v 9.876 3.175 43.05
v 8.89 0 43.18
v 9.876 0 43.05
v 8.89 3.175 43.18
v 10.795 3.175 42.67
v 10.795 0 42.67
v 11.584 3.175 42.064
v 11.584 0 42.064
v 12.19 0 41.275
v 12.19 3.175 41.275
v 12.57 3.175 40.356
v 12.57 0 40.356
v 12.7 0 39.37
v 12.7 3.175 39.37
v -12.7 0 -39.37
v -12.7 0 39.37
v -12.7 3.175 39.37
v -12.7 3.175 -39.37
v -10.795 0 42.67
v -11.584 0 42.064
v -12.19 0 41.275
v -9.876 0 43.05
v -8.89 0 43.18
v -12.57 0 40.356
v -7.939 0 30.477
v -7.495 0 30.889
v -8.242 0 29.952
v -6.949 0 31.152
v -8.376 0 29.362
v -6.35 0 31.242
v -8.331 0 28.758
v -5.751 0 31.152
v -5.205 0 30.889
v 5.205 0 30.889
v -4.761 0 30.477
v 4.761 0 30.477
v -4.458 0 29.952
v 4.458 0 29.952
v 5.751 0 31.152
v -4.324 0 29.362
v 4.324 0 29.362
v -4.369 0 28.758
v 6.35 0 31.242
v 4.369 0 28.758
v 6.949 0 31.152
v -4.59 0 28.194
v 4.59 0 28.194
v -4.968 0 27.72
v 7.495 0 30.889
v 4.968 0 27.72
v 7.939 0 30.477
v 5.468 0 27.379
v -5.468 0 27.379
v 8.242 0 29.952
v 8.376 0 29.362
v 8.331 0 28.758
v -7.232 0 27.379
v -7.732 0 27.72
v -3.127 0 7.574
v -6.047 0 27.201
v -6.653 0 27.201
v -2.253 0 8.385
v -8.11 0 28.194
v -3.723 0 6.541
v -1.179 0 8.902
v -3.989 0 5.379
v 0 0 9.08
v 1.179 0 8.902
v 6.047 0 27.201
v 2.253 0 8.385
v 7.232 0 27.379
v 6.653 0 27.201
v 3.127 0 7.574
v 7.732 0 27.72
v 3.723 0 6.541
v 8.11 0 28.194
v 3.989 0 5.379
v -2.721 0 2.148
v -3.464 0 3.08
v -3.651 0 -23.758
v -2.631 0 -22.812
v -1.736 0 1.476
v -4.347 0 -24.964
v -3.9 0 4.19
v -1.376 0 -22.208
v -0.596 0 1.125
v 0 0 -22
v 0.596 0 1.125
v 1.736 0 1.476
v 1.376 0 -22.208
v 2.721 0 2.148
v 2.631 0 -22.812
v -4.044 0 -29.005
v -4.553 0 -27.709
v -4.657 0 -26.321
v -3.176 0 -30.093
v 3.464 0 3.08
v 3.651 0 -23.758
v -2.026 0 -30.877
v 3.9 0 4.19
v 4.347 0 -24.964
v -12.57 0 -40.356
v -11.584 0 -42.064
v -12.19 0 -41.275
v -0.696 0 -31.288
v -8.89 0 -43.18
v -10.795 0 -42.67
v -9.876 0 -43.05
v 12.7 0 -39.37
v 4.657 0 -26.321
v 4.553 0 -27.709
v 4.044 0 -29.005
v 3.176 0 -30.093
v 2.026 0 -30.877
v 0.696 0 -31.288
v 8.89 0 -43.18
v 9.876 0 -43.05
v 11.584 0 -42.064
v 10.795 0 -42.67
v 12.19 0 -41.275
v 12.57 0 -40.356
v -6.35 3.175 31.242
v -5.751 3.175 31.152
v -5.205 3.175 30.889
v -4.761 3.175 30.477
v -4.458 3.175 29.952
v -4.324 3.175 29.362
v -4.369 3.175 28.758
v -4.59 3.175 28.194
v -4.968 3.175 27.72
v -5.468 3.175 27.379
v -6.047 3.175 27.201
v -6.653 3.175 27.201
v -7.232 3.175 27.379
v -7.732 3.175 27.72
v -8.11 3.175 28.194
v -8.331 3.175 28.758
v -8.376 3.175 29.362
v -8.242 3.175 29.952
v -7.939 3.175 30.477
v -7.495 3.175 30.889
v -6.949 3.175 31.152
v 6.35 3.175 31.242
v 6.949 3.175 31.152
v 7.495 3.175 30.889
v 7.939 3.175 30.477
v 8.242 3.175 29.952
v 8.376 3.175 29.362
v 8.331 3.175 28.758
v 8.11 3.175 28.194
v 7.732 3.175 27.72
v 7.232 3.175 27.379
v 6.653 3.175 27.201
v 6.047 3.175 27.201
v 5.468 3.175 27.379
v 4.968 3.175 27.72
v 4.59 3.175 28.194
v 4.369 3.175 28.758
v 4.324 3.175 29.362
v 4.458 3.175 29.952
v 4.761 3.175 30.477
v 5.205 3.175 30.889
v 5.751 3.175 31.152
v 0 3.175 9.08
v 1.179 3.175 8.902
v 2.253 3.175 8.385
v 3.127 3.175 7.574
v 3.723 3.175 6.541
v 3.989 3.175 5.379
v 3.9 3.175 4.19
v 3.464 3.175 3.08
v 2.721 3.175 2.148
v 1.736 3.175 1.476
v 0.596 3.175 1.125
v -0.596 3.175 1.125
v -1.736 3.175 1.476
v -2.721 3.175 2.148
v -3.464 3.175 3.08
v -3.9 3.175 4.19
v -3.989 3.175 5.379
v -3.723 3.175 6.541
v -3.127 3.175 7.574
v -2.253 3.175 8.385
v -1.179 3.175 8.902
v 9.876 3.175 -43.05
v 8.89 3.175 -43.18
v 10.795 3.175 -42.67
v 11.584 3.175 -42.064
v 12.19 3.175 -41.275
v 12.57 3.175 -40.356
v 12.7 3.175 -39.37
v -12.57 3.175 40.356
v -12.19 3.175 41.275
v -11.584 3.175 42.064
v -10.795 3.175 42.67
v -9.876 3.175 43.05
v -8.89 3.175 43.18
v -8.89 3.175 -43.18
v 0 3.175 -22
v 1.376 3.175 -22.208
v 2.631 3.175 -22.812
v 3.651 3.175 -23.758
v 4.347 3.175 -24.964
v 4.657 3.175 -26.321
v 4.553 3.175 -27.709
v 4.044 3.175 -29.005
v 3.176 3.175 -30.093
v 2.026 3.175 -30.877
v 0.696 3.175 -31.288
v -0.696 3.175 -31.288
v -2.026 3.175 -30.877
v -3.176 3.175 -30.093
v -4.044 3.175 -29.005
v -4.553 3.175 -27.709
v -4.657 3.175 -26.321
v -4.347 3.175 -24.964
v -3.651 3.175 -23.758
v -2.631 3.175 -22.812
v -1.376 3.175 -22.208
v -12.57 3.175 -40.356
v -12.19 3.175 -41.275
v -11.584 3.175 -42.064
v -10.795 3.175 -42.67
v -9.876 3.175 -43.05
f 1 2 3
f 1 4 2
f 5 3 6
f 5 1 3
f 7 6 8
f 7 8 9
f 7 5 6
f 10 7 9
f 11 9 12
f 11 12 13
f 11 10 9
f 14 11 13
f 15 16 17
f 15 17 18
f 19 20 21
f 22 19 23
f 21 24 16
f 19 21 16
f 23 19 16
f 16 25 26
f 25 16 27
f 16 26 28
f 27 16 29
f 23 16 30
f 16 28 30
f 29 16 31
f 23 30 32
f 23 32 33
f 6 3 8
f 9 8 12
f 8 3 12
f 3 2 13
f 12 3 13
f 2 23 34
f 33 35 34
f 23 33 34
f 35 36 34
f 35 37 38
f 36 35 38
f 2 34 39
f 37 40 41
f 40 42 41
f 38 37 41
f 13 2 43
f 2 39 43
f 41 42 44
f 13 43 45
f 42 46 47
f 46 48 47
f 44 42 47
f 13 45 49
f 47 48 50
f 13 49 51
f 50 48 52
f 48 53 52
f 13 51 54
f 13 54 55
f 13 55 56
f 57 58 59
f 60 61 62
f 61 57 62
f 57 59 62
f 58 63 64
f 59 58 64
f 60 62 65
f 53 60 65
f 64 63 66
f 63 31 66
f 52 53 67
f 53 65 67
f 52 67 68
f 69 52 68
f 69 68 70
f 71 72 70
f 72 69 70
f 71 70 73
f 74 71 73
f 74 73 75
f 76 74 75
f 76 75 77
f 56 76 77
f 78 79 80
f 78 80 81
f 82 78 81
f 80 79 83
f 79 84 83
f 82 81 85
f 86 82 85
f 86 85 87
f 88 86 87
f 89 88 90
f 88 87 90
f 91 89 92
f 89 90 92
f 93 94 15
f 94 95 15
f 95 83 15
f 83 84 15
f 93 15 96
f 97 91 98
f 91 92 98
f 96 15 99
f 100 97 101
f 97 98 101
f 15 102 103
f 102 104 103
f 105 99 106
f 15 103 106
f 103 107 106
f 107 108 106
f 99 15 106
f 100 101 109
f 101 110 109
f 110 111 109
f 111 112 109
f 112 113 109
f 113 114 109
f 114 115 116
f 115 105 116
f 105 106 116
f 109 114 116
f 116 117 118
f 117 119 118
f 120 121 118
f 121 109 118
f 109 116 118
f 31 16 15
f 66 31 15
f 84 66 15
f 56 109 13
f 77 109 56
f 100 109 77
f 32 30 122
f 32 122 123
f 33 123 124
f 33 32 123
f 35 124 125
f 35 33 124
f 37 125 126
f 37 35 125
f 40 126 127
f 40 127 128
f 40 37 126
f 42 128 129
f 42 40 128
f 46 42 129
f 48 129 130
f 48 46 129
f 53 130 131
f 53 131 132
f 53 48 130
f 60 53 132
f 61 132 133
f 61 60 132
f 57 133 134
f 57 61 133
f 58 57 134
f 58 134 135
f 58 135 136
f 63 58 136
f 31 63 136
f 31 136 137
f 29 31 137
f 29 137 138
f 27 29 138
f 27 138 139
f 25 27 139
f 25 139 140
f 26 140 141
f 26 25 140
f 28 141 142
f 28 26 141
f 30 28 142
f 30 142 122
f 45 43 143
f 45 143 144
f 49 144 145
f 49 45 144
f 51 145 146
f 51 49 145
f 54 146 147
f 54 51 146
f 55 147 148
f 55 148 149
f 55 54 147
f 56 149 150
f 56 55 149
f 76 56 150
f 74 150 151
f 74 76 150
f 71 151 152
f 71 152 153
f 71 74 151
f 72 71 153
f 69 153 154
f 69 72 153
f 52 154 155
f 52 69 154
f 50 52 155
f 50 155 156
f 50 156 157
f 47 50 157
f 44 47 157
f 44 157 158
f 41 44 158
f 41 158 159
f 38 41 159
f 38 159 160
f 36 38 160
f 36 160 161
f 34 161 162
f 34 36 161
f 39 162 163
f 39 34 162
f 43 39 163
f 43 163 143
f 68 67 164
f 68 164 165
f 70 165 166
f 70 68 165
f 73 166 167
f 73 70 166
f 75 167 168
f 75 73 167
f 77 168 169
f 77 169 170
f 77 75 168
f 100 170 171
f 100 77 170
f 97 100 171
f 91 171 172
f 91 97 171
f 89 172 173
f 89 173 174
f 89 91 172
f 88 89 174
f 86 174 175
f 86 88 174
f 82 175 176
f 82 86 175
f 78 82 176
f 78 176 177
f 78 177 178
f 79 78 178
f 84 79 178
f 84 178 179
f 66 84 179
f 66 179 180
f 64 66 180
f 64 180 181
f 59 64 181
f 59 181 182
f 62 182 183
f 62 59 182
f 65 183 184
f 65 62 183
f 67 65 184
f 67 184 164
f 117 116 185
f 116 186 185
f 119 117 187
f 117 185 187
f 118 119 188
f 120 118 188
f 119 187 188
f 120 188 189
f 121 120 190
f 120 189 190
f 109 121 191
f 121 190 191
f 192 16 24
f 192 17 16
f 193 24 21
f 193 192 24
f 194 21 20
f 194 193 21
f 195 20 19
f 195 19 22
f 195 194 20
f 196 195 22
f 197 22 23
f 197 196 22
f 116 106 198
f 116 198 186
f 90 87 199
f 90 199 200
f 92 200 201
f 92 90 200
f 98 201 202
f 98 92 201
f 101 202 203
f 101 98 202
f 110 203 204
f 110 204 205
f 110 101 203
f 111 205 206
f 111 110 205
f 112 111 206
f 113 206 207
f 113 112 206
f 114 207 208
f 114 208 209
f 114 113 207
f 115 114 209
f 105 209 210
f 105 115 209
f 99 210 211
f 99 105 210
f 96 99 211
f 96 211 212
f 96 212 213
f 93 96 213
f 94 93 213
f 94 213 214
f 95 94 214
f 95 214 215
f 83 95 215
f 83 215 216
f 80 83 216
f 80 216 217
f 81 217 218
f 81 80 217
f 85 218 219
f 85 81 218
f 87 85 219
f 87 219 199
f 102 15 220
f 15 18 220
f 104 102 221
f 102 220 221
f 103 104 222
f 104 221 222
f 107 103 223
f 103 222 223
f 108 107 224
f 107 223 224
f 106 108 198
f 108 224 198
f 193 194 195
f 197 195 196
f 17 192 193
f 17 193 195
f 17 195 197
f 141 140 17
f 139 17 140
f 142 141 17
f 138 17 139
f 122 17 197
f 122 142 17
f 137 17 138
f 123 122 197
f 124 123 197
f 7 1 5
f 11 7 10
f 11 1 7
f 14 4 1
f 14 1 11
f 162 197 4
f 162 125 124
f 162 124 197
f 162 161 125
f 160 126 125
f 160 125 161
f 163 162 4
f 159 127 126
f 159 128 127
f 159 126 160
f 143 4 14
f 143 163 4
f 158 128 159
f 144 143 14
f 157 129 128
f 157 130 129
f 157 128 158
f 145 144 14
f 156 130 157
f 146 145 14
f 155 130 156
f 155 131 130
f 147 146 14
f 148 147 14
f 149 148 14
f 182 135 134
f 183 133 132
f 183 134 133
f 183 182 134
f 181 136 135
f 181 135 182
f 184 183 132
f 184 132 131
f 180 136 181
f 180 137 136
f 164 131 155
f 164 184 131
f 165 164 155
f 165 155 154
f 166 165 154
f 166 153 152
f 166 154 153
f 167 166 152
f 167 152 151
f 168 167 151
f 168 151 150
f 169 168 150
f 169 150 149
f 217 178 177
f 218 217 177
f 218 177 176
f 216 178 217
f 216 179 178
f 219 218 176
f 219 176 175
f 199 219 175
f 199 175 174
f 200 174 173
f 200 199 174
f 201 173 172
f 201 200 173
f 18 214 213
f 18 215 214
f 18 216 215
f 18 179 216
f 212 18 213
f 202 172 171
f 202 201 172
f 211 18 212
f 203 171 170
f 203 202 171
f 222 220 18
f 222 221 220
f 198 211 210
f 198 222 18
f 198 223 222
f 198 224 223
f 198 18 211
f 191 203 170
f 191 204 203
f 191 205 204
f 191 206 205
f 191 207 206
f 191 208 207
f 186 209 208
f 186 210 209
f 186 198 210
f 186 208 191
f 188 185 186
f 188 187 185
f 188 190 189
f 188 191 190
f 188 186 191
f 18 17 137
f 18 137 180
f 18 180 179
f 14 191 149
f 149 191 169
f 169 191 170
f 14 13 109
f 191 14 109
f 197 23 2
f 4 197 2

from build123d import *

# Parameters (mm, degrees)
SKETCH1_W           = 25.4
SKETCH1_H           = 86.36
SKETCH1_R           = 2.032
SKETCH1_R_2         = 4
SKETCH1_R_3         = 4.669733183
BOSS_EXTRUDE1_DEPTH = 3.175
FILLET1_R           = 3.81


with BuildPart() as part:
    # Sketch1 → Boss-Extrude1 (new body)
    with BuildSketch(Plane(origin=(0, 0, 0), x_dir=(1, 0, 0), z_dir=(0, 1, 0))):
        Rectangle(SKETCH1_W, SKETCH1_H)
        with Locations(Location((-6.35, -29.21, 0), (0, 0, 270))):
            Circle(SKETCH1_R, mode=Mode.SUBTRACT)
        with Locations(Location((6.35, -29.21, 0), (0, 0, 270))):
            Circle(SKETCH1_R, mode=Mode.SUBTRACT)
        with Locations(Location((0, -5.08, 0), (0, 0, 270))):
            Circle(SKETCH1_R_2, mode=Mode.SUBTRACT)
        with Locations(Location((0, 26.67, 0), (0, 0, 270))):
            Circle(SKETCH1_R_3, mode=Mode.SUBTRACT)
    extrude(amount=BOSS_EXTRUDE1_DEPTH)

    # Fillet1
    fillet1_edges = [part.edges().sort_by_distance(p)[0] for p in [
        (-12.7, 1.5875, 43.18),
        (-12.7, 1.5875, -43.18),
        (12.7, 1.5875, -43.18),
        (12.7, 1.5875, 43.18),
    ]]
    fillet(fillet1_edges, radius=FILLET1_R)


solid = part.part
